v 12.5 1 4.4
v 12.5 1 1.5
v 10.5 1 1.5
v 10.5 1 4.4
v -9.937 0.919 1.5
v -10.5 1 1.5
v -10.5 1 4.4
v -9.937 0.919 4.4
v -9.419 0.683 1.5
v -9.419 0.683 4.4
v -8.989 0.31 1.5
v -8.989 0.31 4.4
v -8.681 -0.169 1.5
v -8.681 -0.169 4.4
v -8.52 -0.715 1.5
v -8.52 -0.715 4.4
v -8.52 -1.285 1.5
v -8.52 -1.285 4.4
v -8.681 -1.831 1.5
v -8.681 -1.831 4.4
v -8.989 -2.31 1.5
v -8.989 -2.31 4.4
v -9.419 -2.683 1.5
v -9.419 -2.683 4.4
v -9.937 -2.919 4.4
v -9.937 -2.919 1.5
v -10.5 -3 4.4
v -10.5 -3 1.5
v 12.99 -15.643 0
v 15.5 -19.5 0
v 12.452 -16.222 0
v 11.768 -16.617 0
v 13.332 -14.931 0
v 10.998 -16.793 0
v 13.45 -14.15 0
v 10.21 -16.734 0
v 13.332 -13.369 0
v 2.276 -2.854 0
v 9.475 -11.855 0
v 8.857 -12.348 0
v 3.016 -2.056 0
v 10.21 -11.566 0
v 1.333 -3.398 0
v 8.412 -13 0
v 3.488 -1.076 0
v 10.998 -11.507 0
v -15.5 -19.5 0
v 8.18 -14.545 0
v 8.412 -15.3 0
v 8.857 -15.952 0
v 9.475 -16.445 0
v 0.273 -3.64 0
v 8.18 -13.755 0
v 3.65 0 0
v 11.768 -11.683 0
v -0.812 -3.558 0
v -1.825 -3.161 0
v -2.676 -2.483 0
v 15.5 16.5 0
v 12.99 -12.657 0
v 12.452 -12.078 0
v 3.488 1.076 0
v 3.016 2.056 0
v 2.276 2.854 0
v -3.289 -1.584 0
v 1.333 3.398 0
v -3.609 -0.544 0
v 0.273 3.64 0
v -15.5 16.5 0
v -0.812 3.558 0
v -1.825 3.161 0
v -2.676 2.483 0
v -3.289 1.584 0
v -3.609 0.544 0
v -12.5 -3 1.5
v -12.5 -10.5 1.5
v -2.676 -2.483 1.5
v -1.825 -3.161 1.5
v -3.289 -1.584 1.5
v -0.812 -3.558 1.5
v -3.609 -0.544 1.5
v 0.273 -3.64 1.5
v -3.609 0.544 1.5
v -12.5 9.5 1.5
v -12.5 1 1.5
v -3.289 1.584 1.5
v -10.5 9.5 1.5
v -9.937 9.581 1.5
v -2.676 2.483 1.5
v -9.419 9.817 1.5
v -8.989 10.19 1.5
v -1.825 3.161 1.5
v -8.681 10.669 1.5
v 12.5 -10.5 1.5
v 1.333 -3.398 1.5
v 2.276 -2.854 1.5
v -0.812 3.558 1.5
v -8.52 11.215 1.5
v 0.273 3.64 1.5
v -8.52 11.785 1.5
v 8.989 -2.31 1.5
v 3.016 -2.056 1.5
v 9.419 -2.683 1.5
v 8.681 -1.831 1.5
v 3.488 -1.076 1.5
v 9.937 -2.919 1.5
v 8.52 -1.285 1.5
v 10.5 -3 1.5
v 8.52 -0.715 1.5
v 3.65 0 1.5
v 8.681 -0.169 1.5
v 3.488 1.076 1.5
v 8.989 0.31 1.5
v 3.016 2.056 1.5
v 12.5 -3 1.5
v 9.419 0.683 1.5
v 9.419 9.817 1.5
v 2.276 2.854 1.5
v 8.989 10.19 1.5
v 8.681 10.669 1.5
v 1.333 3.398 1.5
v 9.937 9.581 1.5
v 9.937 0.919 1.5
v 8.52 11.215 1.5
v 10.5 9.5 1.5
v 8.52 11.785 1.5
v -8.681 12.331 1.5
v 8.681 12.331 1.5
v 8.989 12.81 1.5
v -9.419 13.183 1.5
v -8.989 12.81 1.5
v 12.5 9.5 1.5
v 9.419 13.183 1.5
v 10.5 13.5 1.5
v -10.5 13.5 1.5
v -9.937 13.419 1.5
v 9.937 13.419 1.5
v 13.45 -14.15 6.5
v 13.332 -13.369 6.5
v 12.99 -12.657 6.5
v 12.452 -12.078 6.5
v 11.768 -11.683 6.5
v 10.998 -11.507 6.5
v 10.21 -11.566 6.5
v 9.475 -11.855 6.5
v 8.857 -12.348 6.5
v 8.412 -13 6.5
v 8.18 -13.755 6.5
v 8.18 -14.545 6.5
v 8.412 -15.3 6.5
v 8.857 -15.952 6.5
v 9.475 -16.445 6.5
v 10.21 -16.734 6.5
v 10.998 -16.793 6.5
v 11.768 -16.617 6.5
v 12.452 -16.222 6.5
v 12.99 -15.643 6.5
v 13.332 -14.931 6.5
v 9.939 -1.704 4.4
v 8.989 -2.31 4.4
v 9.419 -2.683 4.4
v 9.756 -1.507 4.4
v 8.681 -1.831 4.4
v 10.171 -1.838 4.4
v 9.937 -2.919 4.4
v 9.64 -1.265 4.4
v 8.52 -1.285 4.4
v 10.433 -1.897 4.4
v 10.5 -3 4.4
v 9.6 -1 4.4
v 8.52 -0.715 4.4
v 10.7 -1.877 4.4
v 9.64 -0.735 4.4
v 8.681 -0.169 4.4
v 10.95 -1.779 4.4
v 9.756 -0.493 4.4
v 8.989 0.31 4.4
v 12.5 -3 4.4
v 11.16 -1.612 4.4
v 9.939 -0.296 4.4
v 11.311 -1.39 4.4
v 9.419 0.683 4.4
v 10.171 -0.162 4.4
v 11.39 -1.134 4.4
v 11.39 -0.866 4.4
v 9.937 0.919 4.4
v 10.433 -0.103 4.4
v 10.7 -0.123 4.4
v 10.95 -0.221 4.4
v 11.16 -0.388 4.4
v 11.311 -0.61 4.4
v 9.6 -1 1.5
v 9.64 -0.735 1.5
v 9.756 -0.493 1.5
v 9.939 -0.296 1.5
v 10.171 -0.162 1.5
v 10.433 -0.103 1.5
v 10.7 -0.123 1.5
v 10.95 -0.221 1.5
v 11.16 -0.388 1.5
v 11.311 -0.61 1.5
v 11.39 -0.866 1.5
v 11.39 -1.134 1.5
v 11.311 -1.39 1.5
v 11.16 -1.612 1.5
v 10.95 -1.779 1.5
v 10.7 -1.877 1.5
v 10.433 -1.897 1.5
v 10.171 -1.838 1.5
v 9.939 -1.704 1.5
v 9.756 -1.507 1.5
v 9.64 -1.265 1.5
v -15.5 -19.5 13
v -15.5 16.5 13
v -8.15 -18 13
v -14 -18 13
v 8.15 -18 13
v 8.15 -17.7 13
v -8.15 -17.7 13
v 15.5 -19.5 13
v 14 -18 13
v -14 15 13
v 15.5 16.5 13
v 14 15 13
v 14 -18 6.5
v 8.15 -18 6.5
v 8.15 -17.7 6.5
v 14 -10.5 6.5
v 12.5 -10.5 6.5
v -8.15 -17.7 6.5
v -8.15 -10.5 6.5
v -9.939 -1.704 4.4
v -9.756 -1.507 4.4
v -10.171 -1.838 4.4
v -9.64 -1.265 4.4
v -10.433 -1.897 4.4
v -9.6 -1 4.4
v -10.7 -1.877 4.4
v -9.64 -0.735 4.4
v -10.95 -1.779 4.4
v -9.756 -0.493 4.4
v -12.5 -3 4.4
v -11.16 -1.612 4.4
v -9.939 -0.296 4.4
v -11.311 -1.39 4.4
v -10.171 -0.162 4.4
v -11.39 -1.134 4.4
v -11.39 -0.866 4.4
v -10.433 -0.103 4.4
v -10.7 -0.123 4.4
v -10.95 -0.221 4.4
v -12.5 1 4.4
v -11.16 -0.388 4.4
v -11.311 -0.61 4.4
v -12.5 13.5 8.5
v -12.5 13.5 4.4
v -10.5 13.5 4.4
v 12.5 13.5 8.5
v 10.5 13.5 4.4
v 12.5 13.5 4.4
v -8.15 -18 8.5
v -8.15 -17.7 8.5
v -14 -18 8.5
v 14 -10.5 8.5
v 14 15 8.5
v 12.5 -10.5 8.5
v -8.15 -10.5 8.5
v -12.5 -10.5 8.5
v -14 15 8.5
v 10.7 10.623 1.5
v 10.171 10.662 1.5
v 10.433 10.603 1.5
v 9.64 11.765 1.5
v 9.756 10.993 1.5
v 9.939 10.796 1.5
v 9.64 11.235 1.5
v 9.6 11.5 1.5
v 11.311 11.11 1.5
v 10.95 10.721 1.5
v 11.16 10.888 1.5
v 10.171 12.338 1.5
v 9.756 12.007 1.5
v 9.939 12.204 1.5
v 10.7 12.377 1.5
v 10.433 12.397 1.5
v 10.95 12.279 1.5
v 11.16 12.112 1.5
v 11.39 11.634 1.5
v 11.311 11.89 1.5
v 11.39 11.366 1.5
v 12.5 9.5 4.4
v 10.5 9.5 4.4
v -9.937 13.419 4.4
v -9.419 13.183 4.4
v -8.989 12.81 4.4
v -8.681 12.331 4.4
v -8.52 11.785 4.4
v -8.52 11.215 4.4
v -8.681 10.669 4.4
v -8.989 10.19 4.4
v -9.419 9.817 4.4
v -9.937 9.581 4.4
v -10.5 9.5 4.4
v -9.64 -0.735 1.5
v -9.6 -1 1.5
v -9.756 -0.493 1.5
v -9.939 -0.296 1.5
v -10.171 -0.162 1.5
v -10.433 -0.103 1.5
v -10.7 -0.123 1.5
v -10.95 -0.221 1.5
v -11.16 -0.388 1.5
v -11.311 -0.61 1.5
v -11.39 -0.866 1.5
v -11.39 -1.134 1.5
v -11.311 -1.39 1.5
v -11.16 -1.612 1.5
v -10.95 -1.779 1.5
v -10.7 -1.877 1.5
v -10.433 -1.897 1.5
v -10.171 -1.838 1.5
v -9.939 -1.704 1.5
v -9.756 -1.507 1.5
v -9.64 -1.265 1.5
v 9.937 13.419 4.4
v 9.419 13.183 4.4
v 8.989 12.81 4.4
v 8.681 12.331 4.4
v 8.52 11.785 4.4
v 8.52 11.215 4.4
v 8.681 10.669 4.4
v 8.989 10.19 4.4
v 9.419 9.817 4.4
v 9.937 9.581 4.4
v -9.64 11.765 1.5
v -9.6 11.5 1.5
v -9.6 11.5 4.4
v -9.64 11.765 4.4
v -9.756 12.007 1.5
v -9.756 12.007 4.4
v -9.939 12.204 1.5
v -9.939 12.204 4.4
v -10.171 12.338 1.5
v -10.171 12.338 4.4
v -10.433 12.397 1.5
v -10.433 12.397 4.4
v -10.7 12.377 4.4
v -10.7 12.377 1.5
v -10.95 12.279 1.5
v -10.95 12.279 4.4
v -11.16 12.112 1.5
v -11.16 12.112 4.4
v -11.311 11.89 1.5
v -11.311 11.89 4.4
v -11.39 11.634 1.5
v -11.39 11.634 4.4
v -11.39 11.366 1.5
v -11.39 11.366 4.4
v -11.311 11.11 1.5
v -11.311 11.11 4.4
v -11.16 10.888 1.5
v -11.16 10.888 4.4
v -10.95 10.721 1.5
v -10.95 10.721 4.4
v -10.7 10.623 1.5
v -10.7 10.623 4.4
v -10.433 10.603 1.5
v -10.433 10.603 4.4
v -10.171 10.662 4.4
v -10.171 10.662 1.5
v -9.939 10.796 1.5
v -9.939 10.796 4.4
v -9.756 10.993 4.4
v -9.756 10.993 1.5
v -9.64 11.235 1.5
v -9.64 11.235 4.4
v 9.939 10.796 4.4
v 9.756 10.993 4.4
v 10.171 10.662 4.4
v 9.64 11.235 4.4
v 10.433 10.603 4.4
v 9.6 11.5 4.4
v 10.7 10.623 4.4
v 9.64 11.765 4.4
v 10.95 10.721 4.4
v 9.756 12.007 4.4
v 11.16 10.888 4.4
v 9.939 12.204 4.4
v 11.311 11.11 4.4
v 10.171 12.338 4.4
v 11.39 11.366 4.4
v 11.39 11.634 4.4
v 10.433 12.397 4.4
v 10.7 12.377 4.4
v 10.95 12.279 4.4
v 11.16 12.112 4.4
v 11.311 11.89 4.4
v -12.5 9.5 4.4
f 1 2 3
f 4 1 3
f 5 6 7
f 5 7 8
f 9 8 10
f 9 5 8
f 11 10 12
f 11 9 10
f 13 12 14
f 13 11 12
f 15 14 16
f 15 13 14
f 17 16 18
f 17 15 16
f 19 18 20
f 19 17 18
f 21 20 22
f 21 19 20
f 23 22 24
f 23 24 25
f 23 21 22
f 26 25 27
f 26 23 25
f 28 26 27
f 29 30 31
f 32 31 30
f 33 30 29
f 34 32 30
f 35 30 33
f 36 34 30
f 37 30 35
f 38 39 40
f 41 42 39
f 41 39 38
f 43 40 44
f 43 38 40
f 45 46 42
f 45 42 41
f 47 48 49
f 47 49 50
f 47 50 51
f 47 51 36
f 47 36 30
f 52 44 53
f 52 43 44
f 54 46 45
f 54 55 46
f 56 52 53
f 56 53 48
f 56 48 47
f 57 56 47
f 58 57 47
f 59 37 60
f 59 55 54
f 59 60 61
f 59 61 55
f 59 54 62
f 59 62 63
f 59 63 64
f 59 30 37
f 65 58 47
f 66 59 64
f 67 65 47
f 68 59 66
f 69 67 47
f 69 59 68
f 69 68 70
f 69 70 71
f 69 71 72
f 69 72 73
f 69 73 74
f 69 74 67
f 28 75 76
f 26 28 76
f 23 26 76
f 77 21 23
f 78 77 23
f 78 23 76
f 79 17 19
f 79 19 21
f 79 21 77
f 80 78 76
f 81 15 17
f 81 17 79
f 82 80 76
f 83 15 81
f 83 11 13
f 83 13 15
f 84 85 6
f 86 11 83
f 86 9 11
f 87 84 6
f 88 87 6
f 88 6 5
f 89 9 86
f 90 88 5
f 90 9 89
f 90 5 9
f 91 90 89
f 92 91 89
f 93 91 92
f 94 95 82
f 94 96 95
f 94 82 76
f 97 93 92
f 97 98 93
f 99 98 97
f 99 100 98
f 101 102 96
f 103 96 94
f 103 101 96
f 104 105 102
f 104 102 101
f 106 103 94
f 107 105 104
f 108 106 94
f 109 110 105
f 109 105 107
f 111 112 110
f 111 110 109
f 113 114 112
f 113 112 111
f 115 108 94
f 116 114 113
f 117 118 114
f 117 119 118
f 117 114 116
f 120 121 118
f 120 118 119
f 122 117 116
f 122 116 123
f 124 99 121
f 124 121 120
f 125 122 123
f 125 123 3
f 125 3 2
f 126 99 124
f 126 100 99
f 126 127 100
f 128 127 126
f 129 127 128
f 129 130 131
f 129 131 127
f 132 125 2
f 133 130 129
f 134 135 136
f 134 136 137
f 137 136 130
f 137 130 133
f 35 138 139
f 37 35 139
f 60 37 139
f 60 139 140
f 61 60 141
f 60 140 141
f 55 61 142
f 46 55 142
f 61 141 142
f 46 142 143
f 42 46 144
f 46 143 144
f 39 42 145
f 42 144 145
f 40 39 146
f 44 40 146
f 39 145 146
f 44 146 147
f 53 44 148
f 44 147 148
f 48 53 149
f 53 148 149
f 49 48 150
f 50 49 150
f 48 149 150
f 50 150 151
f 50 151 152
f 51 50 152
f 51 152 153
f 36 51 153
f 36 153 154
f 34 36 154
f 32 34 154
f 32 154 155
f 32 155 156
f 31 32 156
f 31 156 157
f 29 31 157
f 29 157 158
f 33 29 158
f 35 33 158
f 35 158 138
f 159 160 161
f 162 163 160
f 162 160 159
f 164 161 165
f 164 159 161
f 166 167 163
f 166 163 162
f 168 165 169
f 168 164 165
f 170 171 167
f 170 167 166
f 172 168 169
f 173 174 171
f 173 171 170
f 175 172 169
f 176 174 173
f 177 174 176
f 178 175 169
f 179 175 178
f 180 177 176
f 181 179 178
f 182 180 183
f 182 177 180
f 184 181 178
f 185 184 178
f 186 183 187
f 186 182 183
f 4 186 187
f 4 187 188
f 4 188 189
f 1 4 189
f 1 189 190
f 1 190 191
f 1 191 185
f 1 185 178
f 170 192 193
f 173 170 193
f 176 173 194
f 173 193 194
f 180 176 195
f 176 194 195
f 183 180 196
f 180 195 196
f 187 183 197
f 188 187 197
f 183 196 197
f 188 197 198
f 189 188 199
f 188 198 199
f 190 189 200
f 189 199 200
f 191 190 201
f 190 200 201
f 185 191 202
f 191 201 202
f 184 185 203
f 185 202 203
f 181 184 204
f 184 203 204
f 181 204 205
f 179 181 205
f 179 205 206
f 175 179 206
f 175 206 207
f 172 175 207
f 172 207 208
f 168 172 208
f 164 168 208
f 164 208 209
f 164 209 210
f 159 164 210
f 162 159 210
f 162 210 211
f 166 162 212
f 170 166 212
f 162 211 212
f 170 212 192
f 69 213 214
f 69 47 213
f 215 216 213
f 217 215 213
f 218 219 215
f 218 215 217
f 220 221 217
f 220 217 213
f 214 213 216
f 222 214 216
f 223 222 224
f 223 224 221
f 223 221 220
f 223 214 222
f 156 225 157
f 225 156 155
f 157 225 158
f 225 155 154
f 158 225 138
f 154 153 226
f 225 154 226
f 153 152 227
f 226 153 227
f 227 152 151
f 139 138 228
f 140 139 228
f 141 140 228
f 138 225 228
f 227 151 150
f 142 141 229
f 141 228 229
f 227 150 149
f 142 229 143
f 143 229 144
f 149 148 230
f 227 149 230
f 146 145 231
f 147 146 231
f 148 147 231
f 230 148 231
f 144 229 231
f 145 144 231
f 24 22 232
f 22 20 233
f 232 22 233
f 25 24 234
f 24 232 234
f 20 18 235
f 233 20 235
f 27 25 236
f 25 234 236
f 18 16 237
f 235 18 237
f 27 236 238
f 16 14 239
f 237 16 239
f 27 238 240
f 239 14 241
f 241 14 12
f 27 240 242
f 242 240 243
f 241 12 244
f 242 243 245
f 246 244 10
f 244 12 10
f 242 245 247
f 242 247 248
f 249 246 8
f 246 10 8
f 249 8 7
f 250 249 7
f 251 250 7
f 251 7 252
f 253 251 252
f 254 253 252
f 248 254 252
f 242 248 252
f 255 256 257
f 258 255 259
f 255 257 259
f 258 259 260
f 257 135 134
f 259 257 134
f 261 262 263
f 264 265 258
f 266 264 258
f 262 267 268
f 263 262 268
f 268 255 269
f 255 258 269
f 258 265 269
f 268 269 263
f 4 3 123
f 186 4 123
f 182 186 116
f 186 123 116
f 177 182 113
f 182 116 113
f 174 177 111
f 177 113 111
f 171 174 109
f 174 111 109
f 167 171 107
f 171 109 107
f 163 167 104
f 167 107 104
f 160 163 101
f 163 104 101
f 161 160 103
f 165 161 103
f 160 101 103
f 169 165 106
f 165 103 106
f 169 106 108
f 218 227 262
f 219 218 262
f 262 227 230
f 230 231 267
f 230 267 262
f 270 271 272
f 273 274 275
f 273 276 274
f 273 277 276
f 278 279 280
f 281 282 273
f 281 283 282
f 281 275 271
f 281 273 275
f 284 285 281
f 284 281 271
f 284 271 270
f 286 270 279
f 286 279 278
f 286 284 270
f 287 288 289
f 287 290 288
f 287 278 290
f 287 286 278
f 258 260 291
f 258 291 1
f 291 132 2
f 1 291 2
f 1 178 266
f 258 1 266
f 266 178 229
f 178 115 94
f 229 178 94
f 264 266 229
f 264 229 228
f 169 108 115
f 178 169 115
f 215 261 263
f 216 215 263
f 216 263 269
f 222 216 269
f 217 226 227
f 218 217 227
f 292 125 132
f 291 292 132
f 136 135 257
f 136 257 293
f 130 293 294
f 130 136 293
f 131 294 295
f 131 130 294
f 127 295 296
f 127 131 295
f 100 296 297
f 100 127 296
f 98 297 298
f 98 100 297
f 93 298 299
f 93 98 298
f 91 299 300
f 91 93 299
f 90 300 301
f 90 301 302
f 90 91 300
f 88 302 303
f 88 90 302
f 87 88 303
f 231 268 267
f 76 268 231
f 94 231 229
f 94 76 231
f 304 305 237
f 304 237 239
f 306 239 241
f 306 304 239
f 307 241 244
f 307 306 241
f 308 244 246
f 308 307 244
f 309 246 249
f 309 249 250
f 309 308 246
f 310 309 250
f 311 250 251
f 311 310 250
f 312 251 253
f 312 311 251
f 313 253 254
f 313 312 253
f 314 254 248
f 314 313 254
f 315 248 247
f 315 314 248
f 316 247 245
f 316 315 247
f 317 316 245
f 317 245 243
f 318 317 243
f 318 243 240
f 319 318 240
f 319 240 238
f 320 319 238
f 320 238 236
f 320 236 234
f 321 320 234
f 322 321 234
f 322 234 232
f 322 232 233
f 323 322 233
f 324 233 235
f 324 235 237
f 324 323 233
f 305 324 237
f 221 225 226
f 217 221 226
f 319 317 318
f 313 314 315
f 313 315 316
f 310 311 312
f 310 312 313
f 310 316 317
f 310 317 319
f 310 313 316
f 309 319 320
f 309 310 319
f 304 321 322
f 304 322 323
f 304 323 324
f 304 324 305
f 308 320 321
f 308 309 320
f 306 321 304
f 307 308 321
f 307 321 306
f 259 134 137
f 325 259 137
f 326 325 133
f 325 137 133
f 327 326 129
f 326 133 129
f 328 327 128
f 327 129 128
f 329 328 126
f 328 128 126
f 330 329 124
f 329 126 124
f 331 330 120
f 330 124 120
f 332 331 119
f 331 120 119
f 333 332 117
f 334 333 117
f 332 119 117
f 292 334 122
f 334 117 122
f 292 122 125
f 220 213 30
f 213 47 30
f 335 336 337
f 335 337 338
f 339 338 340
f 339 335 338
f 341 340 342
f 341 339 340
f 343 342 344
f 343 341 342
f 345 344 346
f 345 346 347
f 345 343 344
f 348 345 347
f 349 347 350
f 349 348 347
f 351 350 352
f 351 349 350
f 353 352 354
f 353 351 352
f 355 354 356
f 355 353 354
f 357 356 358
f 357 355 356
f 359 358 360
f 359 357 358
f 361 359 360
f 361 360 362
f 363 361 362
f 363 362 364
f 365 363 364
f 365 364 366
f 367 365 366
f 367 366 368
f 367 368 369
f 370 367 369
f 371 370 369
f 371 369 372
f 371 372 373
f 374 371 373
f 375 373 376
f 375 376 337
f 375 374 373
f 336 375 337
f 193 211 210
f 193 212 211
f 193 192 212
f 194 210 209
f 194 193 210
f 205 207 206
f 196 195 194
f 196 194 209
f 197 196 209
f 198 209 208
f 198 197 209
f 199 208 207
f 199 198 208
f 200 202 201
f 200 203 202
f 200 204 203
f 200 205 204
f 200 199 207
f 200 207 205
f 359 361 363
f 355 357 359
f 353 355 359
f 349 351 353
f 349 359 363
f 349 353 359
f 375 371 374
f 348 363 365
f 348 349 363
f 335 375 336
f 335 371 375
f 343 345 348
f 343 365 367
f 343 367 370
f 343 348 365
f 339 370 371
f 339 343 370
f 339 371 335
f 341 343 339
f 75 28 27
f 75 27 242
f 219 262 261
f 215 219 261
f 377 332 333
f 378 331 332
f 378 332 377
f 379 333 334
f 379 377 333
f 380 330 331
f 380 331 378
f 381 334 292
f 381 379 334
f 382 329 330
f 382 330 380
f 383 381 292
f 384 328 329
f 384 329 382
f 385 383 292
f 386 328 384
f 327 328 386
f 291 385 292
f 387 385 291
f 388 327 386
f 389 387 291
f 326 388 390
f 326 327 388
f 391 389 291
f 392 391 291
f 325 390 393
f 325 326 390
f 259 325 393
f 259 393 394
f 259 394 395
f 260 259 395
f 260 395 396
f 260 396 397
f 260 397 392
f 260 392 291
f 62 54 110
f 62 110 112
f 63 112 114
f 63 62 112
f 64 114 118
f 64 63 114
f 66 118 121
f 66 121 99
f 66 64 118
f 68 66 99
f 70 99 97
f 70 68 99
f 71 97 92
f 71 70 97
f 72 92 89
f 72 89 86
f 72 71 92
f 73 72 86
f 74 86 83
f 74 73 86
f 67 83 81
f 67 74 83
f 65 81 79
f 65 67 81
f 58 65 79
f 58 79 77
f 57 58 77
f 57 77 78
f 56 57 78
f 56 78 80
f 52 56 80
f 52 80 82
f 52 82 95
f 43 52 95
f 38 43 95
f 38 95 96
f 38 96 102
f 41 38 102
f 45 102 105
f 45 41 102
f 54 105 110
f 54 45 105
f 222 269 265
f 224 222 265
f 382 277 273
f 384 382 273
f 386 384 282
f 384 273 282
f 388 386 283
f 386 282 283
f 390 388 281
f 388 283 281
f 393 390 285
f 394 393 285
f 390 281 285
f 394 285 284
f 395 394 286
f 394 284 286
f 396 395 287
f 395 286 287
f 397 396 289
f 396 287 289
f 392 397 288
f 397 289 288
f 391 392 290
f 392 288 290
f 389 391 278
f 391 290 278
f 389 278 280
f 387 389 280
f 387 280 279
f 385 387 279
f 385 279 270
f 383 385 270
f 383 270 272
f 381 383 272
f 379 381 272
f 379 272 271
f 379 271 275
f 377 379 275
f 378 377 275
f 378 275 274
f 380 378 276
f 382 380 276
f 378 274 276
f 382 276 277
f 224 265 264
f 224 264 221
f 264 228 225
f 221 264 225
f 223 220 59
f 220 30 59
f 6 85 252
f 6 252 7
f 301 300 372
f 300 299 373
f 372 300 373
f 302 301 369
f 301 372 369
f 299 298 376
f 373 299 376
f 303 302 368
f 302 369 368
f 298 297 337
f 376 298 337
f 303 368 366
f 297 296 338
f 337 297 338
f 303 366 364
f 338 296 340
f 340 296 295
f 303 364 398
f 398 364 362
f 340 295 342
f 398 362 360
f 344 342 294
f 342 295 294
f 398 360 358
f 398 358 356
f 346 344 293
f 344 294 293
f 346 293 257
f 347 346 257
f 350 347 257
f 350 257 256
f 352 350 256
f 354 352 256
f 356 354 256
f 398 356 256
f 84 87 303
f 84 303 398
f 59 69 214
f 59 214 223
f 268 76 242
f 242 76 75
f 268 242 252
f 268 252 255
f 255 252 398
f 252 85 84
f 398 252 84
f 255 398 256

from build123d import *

# Parameters (mm, degrees)
CROQUIS1_W               = 25
CROQUIS1_H               = 24
CROQUIS1_R               = 3.65
SALIENTE_EXTRUIR1_DEPTH  = 1.5
SALIENTE_EXTRUIR7_DEPTH  = 8.5
CROQUIS2_R               = 0.9
SALIENTE_EXTRUIR2_DEPTH  = 2.9
CROQUIS5_W               = 31
CROQUIS5_H               = 9
SALIENTE_EXTRUIR8_DEPTH  = 6.5
CROQUIS6_R               = 2.65
CORTAR_EXTRUIR1_DEPTH    = 6.5
SALIENTE_EXTRUIR9_DEPTH  = 2
CROQUIS8_W               = 31
CROQUIS8_H               = 36
SALIENTE_EXTRUIR10_DEPTH = 4.5
CROQUIS9_W               = 5.85
CROQUIS9_H               = 7.5
CORTAR_EXTRUIR3_DEPTH    = 2


with BuildPart() as part:
    # Croquis1 → Saliente-Extruir1 (new body)
    with BuildSketch(Plane.XY):
        with Locations((0, 1.5)):
            Rectangle(CROQUIS1_W, CROQUIS1_H)
        Circle(CROQUIS1_R, mode=Mode.SUBTRACT)
    extrude(amount=SALIENTE_EXTRUIR1_DEPTH)

    # Croquis4 → Saliente-Extruir7 (add)
    with BuildSketch(Plane(origin=(0, 0, 0), x_dir=(-1, 0, 0), z_dir=(0, 0, -1))):
        Polygon((12.5, -10.5), (12.5, 13.5), (-12.5, 13.5), (-12.5, -10.5), (-15.5, -10.5), (-15.5, 16.5), (15.5, 16.5), (15.5, -10.5), align=None)
    extrude(amount=-SALIENTE_EXTRUIR7_DEPTH)

    # Croquis2 → Saliente-Extruir2 (add)
    with BuildSketch(Plane.XY.offset(1.5)):
        with BuildLine():
            Line((-10.5, 9.5), (-12.5, 9.5))
            Line((-12.5, 9.5), (-12.5, 13.5))
            Line((-12.5, 13.5), (-10.5, 13.5))
            ThreePointArc((-10.5, 13.5), (-8.5, 11.5), (-10.5, 9.5))
        make_face()
        with Locations((-10.5, 11.5)):
            Circle(CROQUIS2_R, mode=Mode.SUBTRACT)
        with BuildLine():
            Line((-10.5, -3), (-12.5, -3))
            Line((-12.5, -3), (-12.5, 1))
            Line((-12.5, 1), (-10.5, 1))
            ThreePointArc((-10.5, 1), (-8.5, -1), (-10.5, -3))
        make_face()
        with Locations((-10.5, -1)):
            Circle(CROQUIS2_R, mode=Mode.SUBTRACT)
    saliente_extruir2 = extrude(amount=SALIENTE_EXTRUIR2_DEPTH)

    # Simetría2: Saliente-Extruir2 across plane
    add(saliente_extruir2.mirror(Plane(origin=(0, 0, 0), x_dir=(0, 0, 1), z_dir=(1, 0, 0))))

    # Croquis5 → Saliente-Extruir8 (add)
    with BuildSketch(Plane(origin=(0, 0, 0), x_dir=(-1, 0, 0), z_dir=(0, 0, -1))):
        with Locations((0, -15)):
            Rectangle(CROQUIS5_W, CROQUIS5_H)
    extrude(amount=-SALIENTE_EXTRUIR8_DEPTH)

    # Croquis6 → Cortar-Extruir1 (cut)
    with BuildSketch(Plane.XY.offset(6.5)):
        with Locations((10.8, -14.15)):
            Circle(CROQUIS6_R)
    extrude(amount=-CORTAR_EXTRUIR1_DEPTH, mode=Mode.SUBTRACT)

    # Croquis7 → Saliente-Extruir9 (add)
    with BuildSketch(Plane.XY.offset(6.5)):
        with BuildLine():
            Line((-15.5, -10.5), (-8.15, -10.5))
            Line((-8.15, -10.5), (-8.15, -17.7))
            Line((-8.15, -17.7), (8.15, -17.7))
            Line((8.15, -17.7), (8.15, -14.768763357))
            Line((8.15, -14.768763357), (8.223251679, -14.768763357))
            ThreePointArc((8.223251679, -14.768763357), (13.448478088, -14.239798753), (8.271080496, -13.35812492))
            Line((8.271080496, -13.35812492), (8.15, -13.35812492))
            Line((8.15, -13.35812492), (8.15, -10.5))
            Line((8.15, -10.5), (15.5, -10.5))
            Line((15.5, -10.5), (15.5, -19.5))
            Line((15.5, -19.5), (8.15, -19.5))
            Line((8.15, -19.5), (-8.15, -19.5))
            Line((-8.15, -19.5), (-15.5, -19.5))
            Line((-15.5, -19.5), (-15.5, -10.5))
        make_face()
    extrude(amount=SALIENTE_EXTRUIR9_DEPTH)

    # Croquis8 → Saliente-Extruir10 (add)
    with BuildSketch(Plane.XY.offset(8.5)):
        with Locations((0, -1.5)):
            Rectangle(CROQUIS8_W, CROQUIS8_H)
        Polygon((-14, 15), (14, 15), (14, -18), (8.15, -18), (8.15, -17.7), (-8.15, -17.7), (-8.15, -18), (-14, -18), align=None, mode=Mode.SUBTRACT)
    extrude(amount=SALIENTE_EXTRUIR10_DEPTH)

    # Croquis9 → Cortar-Extruir3 (cut)
    with BuildSketch(Plane.XY.offset(8.5)):
        with Locations((11.075, -14.25)):
            Rectangle(CROQUIS9_W, CROQUIS9_H)
    extrude(amount=-CORTAR_EXTRUIR3_DEPTH, mode=Mode.SUBTRACT)


solid = part.part
